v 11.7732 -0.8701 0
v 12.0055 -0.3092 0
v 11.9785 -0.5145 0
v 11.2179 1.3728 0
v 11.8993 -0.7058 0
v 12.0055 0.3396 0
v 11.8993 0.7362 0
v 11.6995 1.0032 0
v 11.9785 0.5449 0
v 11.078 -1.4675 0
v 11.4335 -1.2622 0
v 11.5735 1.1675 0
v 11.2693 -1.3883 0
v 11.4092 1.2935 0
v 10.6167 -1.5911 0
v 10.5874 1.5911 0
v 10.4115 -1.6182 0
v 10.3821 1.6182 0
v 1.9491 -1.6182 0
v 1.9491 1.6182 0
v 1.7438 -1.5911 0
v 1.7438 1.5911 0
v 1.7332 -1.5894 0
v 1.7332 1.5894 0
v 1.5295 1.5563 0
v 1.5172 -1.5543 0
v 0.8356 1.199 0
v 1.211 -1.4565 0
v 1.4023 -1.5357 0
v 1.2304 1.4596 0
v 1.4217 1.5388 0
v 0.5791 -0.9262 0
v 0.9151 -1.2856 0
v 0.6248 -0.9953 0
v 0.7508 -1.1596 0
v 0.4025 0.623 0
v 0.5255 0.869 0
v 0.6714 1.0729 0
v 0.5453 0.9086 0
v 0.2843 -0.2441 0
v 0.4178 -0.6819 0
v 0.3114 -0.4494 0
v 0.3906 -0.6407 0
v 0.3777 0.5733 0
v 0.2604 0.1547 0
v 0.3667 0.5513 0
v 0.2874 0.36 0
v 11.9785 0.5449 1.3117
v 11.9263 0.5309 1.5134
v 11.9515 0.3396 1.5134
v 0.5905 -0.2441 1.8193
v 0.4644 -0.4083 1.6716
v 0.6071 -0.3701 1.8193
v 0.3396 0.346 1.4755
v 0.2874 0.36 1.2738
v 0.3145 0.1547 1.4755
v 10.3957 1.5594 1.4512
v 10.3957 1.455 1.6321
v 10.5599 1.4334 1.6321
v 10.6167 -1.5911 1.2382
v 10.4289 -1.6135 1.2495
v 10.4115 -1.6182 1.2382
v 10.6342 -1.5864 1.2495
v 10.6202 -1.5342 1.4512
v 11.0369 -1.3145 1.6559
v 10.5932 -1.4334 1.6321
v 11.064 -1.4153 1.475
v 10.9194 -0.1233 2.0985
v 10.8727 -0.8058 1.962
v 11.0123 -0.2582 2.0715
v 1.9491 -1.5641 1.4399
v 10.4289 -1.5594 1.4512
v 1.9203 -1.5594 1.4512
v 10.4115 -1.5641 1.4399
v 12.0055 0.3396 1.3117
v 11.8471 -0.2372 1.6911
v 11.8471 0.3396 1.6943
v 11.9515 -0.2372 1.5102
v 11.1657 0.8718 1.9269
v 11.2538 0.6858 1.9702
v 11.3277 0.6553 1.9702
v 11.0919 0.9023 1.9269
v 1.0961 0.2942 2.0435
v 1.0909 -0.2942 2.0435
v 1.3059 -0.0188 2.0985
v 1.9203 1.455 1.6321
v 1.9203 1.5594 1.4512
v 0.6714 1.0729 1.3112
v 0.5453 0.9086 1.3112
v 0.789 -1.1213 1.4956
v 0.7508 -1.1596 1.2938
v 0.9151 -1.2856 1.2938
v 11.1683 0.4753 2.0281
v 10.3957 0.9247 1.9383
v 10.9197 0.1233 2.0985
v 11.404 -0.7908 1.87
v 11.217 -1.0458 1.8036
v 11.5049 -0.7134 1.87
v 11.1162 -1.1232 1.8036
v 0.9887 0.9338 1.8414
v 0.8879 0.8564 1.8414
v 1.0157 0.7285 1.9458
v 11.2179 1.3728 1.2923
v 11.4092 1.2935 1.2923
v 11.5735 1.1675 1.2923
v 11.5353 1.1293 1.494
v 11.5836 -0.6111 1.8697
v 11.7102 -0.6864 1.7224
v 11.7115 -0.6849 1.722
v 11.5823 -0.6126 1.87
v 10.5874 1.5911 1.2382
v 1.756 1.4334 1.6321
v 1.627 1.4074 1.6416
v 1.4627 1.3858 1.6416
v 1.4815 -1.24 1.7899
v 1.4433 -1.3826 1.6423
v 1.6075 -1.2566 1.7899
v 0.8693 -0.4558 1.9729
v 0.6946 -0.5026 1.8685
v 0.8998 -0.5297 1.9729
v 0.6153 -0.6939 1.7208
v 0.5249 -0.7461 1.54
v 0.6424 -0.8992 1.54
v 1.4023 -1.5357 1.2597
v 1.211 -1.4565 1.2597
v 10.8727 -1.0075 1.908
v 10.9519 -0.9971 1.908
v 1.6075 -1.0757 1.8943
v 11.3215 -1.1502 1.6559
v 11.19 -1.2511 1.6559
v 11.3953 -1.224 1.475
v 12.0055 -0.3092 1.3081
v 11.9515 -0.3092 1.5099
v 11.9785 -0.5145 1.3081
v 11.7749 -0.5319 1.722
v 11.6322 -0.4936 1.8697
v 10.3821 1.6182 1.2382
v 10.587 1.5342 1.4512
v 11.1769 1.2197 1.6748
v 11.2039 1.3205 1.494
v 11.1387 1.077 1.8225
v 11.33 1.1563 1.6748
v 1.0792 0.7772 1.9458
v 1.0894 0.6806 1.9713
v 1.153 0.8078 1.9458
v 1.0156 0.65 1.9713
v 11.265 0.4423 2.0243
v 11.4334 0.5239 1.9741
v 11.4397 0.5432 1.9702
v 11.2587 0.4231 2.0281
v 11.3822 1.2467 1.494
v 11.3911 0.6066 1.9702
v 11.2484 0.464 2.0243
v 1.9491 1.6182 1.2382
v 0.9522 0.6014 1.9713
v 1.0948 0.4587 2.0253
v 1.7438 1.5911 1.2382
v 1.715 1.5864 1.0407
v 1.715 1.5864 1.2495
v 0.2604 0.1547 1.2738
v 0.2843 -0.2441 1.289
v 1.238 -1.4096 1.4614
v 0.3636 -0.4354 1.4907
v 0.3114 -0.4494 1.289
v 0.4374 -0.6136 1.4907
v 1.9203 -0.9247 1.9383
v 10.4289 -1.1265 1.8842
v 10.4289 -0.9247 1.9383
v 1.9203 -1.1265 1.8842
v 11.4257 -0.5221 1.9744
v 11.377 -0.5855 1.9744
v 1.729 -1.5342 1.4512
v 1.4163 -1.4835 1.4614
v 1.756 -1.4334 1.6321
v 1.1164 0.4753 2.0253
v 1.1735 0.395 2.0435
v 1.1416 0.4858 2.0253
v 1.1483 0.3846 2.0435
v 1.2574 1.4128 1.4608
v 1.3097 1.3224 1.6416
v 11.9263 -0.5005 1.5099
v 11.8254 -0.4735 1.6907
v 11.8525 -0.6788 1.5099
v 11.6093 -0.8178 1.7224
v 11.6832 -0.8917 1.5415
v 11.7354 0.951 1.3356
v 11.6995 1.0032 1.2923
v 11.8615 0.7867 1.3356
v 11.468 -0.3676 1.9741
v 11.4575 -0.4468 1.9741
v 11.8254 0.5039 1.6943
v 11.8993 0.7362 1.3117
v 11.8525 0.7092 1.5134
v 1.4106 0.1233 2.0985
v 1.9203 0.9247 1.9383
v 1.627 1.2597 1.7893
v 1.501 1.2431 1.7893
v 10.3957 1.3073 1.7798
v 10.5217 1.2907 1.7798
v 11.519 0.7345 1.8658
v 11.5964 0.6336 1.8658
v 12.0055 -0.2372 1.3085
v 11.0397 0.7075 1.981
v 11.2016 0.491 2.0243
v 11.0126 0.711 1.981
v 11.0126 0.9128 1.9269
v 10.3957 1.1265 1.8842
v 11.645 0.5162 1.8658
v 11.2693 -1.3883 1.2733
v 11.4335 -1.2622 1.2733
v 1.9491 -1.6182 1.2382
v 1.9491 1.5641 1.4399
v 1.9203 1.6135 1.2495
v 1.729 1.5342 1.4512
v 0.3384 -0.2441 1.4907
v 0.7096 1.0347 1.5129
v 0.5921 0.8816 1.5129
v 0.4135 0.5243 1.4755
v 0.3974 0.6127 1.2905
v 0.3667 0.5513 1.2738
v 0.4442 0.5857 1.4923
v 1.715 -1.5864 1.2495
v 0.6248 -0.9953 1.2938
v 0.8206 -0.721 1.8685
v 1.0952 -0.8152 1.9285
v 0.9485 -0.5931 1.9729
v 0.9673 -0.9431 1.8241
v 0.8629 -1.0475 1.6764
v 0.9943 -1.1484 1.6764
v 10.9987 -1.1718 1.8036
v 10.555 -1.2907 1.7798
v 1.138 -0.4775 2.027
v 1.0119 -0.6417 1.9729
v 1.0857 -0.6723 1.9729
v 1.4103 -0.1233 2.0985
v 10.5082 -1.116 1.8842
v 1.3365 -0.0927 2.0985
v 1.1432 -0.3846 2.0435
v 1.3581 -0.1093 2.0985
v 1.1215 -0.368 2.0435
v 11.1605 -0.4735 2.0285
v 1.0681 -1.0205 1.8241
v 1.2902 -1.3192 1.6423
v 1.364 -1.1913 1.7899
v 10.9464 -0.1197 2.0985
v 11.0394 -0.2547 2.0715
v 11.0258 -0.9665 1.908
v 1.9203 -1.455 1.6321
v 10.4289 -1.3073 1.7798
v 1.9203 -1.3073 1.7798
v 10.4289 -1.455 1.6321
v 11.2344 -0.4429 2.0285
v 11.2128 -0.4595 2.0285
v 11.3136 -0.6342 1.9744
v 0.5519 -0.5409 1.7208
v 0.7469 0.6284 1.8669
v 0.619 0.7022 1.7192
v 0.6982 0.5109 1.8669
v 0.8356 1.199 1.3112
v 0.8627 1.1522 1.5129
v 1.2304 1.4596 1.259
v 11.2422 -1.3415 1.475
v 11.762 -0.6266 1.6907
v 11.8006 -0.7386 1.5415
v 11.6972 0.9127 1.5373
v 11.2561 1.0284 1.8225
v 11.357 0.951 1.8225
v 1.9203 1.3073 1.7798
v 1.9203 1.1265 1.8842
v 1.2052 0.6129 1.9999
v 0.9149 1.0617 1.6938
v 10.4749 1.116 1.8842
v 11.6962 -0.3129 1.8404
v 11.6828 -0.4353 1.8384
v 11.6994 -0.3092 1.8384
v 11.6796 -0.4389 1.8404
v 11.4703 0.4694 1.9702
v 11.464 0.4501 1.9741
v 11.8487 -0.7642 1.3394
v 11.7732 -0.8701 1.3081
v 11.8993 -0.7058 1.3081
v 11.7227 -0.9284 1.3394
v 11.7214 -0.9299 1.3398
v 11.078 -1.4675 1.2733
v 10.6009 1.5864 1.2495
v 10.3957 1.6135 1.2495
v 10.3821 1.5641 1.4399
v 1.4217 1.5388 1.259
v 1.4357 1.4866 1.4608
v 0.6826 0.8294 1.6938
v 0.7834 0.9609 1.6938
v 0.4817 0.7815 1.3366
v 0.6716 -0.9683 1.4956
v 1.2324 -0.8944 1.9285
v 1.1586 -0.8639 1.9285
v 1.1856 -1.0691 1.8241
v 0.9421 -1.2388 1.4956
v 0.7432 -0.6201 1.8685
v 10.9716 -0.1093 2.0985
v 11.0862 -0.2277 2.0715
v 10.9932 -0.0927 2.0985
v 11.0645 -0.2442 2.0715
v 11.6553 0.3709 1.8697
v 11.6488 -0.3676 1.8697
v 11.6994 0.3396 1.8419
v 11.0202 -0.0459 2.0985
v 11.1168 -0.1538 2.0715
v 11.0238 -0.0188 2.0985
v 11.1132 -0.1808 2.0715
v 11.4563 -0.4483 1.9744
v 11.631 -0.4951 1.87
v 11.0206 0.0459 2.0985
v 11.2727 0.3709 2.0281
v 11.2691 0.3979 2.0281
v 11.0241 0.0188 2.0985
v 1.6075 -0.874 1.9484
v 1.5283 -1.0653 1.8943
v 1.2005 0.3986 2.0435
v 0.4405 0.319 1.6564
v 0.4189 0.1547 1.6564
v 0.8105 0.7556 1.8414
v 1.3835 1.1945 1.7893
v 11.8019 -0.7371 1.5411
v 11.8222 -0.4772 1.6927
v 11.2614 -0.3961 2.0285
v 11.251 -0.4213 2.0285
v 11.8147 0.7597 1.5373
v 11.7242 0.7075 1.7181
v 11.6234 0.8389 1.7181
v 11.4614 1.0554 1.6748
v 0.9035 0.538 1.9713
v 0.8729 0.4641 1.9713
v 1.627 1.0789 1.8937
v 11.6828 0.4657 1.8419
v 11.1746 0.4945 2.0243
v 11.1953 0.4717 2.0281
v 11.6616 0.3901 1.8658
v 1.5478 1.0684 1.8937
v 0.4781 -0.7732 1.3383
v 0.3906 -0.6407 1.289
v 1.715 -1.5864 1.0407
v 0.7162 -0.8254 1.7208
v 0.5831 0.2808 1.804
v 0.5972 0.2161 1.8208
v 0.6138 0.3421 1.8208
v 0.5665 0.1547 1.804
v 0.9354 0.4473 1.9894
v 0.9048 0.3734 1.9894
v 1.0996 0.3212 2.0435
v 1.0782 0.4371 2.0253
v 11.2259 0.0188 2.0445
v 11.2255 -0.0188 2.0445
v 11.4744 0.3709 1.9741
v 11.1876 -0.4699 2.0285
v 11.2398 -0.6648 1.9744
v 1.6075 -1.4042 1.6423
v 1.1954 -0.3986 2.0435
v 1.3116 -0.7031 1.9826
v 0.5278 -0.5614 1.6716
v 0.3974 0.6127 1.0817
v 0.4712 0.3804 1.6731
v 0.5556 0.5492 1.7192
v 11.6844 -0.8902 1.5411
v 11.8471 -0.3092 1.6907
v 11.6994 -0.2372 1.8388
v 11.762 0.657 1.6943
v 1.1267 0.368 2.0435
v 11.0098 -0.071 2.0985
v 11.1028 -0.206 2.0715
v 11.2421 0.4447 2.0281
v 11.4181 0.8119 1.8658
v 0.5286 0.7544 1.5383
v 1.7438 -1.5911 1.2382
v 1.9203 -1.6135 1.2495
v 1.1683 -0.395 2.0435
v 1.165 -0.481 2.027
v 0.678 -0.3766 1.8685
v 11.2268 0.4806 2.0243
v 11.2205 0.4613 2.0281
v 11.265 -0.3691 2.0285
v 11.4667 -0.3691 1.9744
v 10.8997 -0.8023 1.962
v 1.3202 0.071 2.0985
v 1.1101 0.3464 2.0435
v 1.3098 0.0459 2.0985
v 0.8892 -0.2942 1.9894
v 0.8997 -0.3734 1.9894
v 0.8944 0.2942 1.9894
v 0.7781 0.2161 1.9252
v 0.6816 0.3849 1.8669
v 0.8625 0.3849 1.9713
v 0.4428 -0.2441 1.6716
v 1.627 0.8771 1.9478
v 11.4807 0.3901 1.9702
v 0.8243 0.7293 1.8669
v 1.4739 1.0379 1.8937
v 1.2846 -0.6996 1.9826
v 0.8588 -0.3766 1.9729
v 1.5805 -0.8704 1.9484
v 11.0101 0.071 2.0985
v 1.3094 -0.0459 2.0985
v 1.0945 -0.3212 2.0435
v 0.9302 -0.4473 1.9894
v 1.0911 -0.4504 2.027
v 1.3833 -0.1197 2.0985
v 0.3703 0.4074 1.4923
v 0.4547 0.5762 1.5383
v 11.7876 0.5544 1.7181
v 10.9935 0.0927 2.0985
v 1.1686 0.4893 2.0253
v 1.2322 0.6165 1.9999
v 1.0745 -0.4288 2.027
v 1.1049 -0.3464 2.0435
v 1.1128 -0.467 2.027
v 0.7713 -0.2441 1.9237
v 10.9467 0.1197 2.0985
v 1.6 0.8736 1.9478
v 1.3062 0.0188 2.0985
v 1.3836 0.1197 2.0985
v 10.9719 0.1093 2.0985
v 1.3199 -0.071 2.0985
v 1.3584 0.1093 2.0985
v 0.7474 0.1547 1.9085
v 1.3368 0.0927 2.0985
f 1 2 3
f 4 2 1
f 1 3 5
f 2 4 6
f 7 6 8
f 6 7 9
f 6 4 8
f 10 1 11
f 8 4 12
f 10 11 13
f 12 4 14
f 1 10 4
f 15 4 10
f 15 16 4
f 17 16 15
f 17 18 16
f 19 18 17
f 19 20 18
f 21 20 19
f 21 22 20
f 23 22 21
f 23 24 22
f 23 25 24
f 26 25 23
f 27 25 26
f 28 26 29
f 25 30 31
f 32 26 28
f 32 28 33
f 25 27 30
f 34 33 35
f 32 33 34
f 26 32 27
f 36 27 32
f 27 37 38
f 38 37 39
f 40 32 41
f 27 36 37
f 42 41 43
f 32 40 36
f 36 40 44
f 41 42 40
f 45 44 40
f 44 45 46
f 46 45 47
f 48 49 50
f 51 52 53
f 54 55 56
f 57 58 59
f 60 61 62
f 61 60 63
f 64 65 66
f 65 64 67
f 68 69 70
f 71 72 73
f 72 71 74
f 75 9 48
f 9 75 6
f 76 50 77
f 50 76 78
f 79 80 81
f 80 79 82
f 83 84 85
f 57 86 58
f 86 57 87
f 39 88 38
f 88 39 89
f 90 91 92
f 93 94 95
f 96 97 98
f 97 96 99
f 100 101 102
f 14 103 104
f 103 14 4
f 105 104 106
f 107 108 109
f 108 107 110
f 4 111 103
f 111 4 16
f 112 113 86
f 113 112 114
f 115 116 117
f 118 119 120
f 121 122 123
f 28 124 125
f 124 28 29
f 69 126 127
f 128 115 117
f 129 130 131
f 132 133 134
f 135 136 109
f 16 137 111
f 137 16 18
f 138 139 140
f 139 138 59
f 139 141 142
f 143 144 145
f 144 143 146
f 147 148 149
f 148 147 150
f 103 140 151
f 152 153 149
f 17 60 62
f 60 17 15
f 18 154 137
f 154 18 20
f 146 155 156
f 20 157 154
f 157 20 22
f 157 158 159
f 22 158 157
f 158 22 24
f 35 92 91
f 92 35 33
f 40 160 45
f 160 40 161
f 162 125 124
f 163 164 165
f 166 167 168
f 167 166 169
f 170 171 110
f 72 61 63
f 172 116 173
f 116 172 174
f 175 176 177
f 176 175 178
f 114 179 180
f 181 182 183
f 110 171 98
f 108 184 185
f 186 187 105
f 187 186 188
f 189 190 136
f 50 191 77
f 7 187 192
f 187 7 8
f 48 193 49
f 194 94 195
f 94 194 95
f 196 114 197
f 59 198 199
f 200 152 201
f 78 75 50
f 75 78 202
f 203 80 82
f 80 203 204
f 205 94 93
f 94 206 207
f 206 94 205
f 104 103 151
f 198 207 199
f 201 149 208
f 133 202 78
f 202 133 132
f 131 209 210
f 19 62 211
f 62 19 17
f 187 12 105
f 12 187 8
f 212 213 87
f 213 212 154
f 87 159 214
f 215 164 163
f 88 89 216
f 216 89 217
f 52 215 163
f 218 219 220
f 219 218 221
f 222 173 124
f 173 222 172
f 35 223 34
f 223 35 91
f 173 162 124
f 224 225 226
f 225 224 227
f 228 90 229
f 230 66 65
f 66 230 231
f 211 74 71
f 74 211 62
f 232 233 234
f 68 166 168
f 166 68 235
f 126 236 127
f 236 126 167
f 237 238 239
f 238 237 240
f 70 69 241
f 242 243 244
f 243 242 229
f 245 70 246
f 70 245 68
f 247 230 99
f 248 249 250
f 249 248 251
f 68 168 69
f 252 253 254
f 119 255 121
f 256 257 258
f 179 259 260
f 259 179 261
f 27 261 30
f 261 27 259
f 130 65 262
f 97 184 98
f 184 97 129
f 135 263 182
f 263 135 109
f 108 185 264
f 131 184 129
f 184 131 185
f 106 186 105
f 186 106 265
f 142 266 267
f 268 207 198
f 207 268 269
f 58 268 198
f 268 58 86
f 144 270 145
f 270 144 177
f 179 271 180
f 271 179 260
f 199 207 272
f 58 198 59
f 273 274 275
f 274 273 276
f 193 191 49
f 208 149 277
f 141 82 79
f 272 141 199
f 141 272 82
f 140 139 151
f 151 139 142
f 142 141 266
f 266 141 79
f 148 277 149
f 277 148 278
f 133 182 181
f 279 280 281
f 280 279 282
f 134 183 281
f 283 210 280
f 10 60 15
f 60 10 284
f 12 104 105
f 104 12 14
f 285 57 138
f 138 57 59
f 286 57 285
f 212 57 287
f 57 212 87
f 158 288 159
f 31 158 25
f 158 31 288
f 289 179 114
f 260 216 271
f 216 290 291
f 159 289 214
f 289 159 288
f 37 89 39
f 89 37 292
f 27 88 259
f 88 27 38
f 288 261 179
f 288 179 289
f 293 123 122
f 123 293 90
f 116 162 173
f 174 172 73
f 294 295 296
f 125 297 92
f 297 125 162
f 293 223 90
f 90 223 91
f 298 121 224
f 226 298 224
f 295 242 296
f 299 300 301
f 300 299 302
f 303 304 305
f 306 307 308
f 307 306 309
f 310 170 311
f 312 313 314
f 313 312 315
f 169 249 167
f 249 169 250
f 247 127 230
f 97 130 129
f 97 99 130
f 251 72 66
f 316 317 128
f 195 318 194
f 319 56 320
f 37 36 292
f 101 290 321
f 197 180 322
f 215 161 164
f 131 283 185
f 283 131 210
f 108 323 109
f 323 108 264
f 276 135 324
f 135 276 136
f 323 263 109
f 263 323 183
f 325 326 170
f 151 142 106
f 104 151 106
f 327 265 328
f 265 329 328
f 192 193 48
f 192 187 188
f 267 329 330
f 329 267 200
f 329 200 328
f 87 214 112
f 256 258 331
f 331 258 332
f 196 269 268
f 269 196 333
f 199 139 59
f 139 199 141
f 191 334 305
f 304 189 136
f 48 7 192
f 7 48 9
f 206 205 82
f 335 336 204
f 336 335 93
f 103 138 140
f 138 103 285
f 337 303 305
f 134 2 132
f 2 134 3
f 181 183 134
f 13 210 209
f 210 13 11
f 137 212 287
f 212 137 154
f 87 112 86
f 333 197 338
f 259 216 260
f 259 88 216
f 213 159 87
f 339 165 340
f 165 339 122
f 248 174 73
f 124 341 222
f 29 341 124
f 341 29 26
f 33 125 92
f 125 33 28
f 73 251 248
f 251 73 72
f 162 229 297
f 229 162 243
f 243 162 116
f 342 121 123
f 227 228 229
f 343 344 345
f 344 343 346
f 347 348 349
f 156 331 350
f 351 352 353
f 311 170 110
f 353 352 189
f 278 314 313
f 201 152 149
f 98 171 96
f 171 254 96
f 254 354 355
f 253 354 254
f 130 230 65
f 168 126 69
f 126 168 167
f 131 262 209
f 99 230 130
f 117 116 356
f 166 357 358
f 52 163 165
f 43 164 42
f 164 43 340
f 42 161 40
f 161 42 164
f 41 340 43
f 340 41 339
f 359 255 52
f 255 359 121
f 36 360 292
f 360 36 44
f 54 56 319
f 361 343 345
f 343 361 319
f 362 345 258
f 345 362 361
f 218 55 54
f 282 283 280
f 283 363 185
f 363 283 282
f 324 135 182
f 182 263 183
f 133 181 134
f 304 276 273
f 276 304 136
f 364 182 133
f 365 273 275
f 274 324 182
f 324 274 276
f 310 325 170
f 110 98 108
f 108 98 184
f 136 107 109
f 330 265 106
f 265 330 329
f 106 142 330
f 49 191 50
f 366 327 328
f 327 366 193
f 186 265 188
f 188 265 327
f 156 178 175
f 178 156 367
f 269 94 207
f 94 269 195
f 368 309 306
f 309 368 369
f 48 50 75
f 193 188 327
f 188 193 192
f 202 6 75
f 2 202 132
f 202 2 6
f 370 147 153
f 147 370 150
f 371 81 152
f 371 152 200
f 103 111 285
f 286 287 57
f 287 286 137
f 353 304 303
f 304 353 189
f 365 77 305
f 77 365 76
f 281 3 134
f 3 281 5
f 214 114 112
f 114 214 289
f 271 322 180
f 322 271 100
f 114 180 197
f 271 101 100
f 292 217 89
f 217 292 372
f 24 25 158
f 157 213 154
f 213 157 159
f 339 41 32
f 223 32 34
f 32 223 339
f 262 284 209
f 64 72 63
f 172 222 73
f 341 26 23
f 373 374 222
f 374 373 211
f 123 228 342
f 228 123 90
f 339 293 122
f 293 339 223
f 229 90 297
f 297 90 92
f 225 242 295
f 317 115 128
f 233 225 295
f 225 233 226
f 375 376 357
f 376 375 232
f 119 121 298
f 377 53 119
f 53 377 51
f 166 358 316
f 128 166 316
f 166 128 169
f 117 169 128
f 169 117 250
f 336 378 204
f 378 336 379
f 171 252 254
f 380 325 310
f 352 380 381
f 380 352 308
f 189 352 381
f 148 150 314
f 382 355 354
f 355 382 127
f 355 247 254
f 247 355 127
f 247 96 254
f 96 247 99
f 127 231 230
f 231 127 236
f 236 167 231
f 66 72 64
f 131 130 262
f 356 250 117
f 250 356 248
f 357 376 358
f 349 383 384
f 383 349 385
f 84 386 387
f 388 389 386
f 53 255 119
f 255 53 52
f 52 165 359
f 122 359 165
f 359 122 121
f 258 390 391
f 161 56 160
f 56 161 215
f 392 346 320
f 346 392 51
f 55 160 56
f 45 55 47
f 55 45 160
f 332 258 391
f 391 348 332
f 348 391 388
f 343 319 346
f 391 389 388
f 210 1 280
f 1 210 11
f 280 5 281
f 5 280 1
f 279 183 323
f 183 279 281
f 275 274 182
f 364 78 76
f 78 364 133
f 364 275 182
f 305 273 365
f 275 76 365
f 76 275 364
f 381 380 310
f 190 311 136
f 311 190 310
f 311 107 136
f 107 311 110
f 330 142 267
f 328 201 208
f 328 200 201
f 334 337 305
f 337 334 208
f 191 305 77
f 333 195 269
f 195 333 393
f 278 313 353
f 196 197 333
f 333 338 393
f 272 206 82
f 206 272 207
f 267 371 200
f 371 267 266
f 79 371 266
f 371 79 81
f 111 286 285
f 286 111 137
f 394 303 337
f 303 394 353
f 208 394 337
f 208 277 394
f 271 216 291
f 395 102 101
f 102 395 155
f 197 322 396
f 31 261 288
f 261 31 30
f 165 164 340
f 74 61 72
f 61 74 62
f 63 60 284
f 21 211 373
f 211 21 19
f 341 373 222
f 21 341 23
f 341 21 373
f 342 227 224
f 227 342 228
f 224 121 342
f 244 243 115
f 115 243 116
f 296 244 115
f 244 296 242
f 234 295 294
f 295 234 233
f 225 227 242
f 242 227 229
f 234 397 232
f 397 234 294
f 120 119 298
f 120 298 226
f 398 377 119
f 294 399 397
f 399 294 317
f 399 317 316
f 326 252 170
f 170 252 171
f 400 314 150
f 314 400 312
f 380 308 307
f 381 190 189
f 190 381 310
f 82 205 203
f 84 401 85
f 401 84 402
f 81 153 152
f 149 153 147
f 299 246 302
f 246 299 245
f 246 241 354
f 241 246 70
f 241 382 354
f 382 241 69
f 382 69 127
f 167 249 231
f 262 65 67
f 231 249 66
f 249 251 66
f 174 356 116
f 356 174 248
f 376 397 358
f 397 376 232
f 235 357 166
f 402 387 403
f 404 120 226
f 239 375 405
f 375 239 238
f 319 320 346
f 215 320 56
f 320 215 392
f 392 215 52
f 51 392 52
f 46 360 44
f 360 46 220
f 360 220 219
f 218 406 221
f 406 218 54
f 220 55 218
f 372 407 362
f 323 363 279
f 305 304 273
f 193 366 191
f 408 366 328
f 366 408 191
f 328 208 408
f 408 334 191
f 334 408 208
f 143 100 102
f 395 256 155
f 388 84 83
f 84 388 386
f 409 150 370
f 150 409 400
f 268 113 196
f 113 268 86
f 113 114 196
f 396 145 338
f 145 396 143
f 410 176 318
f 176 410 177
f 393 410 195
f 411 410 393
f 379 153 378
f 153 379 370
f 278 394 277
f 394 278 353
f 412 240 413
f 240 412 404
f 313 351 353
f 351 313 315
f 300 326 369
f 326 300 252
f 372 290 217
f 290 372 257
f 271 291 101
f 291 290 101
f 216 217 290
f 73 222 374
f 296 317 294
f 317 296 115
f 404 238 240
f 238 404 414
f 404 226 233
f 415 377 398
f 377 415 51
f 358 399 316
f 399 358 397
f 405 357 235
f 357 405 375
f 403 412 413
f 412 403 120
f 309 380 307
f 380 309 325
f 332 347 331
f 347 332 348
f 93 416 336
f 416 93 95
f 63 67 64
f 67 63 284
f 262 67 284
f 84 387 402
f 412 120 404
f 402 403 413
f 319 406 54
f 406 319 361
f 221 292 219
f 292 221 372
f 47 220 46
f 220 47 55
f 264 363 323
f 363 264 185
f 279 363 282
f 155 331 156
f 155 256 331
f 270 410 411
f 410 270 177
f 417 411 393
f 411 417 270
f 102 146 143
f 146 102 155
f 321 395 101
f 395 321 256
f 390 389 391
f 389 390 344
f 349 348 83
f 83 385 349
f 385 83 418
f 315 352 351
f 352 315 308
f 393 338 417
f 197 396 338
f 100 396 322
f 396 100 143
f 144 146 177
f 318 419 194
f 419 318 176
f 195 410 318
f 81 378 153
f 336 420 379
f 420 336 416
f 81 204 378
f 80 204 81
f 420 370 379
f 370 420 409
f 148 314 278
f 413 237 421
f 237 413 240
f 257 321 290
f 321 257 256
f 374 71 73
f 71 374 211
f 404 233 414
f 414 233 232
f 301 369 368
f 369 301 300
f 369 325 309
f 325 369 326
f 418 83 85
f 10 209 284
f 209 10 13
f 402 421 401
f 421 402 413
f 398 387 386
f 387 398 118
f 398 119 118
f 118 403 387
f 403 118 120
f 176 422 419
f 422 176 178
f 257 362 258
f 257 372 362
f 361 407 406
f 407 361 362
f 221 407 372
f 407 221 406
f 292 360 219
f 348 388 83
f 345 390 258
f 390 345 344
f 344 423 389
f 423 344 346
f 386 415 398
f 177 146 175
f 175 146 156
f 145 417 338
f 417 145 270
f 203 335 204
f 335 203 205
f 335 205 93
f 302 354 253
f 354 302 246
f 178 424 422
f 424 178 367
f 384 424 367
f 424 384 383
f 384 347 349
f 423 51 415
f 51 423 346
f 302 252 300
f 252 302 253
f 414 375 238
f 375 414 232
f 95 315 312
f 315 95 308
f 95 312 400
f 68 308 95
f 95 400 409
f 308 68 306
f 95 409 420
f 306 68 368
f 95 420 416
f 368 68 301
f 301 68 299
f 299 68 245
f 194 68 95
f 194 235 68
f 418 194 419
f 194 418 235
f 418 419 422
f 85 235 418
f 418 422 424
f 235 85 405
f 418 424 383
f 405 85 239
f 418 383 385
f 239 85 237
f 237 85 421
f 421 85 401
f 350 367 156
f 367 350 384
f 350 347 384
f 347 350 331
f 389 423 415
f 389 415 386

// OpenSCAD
lenght=12+1/4;
hwidth=(3+1/4)*.5;
clearance=-.5;
ph=-.80;

bottom=[[0,0],[lenght,0],[lenght-.5,1+1/4],[lenght-1,hwidth],[1+1/8+1/2,hwidth],[1/2,1+1/4]];
$fn=12;

intersection(){
  linear_extrude(2+1/2-clearance) { mirror([0,1]) 

polygon(bottom); polygon(bottom);}
minkowski(){
    sphere(abs(ph),$fn=24);

intersection(){
    

translate([0,0,clearance])linear_extrude(2+1/2-clearance)
{
      offset(ph)offset(1.6) offset(-1.6){
mirror([0,1]) 

polygon(bottom);
polygon(bottom);
}}

top=[[0,clearance*5],[lenght,clearance*5] , [lenght,1+1/2],
[lenght-1,1+1/2+5/8]
, [1+1/8,1+1/2+5/8]
, [0,1+1/2 ] 
];

 rotate([90,0,clearance])linear_extrude(3+1/4,center=true)
{
   offset(ph) offset(1) offset(-1)
    {  polygon(top);

    
    
    } }
    
    
    front=[[ hwidth,clearance*4],[  hwidth,1+1/2],[  1+1/4,1+1/2+3/8],[  0,1+1/2+5/8],[  -(1+1/4),(1+1/2+3/8)],[  -hwidth,1+1/2],[ -hwidth,clearance*4 ]];
    
     rotate([0, 90, 0])rotate([0, 0,  90])linear_extrude( lenght )
{
   offset(ph) offset(.5) offset(-.5)
    {   polygon(front);
    }
    
    
    }
     }
}}
